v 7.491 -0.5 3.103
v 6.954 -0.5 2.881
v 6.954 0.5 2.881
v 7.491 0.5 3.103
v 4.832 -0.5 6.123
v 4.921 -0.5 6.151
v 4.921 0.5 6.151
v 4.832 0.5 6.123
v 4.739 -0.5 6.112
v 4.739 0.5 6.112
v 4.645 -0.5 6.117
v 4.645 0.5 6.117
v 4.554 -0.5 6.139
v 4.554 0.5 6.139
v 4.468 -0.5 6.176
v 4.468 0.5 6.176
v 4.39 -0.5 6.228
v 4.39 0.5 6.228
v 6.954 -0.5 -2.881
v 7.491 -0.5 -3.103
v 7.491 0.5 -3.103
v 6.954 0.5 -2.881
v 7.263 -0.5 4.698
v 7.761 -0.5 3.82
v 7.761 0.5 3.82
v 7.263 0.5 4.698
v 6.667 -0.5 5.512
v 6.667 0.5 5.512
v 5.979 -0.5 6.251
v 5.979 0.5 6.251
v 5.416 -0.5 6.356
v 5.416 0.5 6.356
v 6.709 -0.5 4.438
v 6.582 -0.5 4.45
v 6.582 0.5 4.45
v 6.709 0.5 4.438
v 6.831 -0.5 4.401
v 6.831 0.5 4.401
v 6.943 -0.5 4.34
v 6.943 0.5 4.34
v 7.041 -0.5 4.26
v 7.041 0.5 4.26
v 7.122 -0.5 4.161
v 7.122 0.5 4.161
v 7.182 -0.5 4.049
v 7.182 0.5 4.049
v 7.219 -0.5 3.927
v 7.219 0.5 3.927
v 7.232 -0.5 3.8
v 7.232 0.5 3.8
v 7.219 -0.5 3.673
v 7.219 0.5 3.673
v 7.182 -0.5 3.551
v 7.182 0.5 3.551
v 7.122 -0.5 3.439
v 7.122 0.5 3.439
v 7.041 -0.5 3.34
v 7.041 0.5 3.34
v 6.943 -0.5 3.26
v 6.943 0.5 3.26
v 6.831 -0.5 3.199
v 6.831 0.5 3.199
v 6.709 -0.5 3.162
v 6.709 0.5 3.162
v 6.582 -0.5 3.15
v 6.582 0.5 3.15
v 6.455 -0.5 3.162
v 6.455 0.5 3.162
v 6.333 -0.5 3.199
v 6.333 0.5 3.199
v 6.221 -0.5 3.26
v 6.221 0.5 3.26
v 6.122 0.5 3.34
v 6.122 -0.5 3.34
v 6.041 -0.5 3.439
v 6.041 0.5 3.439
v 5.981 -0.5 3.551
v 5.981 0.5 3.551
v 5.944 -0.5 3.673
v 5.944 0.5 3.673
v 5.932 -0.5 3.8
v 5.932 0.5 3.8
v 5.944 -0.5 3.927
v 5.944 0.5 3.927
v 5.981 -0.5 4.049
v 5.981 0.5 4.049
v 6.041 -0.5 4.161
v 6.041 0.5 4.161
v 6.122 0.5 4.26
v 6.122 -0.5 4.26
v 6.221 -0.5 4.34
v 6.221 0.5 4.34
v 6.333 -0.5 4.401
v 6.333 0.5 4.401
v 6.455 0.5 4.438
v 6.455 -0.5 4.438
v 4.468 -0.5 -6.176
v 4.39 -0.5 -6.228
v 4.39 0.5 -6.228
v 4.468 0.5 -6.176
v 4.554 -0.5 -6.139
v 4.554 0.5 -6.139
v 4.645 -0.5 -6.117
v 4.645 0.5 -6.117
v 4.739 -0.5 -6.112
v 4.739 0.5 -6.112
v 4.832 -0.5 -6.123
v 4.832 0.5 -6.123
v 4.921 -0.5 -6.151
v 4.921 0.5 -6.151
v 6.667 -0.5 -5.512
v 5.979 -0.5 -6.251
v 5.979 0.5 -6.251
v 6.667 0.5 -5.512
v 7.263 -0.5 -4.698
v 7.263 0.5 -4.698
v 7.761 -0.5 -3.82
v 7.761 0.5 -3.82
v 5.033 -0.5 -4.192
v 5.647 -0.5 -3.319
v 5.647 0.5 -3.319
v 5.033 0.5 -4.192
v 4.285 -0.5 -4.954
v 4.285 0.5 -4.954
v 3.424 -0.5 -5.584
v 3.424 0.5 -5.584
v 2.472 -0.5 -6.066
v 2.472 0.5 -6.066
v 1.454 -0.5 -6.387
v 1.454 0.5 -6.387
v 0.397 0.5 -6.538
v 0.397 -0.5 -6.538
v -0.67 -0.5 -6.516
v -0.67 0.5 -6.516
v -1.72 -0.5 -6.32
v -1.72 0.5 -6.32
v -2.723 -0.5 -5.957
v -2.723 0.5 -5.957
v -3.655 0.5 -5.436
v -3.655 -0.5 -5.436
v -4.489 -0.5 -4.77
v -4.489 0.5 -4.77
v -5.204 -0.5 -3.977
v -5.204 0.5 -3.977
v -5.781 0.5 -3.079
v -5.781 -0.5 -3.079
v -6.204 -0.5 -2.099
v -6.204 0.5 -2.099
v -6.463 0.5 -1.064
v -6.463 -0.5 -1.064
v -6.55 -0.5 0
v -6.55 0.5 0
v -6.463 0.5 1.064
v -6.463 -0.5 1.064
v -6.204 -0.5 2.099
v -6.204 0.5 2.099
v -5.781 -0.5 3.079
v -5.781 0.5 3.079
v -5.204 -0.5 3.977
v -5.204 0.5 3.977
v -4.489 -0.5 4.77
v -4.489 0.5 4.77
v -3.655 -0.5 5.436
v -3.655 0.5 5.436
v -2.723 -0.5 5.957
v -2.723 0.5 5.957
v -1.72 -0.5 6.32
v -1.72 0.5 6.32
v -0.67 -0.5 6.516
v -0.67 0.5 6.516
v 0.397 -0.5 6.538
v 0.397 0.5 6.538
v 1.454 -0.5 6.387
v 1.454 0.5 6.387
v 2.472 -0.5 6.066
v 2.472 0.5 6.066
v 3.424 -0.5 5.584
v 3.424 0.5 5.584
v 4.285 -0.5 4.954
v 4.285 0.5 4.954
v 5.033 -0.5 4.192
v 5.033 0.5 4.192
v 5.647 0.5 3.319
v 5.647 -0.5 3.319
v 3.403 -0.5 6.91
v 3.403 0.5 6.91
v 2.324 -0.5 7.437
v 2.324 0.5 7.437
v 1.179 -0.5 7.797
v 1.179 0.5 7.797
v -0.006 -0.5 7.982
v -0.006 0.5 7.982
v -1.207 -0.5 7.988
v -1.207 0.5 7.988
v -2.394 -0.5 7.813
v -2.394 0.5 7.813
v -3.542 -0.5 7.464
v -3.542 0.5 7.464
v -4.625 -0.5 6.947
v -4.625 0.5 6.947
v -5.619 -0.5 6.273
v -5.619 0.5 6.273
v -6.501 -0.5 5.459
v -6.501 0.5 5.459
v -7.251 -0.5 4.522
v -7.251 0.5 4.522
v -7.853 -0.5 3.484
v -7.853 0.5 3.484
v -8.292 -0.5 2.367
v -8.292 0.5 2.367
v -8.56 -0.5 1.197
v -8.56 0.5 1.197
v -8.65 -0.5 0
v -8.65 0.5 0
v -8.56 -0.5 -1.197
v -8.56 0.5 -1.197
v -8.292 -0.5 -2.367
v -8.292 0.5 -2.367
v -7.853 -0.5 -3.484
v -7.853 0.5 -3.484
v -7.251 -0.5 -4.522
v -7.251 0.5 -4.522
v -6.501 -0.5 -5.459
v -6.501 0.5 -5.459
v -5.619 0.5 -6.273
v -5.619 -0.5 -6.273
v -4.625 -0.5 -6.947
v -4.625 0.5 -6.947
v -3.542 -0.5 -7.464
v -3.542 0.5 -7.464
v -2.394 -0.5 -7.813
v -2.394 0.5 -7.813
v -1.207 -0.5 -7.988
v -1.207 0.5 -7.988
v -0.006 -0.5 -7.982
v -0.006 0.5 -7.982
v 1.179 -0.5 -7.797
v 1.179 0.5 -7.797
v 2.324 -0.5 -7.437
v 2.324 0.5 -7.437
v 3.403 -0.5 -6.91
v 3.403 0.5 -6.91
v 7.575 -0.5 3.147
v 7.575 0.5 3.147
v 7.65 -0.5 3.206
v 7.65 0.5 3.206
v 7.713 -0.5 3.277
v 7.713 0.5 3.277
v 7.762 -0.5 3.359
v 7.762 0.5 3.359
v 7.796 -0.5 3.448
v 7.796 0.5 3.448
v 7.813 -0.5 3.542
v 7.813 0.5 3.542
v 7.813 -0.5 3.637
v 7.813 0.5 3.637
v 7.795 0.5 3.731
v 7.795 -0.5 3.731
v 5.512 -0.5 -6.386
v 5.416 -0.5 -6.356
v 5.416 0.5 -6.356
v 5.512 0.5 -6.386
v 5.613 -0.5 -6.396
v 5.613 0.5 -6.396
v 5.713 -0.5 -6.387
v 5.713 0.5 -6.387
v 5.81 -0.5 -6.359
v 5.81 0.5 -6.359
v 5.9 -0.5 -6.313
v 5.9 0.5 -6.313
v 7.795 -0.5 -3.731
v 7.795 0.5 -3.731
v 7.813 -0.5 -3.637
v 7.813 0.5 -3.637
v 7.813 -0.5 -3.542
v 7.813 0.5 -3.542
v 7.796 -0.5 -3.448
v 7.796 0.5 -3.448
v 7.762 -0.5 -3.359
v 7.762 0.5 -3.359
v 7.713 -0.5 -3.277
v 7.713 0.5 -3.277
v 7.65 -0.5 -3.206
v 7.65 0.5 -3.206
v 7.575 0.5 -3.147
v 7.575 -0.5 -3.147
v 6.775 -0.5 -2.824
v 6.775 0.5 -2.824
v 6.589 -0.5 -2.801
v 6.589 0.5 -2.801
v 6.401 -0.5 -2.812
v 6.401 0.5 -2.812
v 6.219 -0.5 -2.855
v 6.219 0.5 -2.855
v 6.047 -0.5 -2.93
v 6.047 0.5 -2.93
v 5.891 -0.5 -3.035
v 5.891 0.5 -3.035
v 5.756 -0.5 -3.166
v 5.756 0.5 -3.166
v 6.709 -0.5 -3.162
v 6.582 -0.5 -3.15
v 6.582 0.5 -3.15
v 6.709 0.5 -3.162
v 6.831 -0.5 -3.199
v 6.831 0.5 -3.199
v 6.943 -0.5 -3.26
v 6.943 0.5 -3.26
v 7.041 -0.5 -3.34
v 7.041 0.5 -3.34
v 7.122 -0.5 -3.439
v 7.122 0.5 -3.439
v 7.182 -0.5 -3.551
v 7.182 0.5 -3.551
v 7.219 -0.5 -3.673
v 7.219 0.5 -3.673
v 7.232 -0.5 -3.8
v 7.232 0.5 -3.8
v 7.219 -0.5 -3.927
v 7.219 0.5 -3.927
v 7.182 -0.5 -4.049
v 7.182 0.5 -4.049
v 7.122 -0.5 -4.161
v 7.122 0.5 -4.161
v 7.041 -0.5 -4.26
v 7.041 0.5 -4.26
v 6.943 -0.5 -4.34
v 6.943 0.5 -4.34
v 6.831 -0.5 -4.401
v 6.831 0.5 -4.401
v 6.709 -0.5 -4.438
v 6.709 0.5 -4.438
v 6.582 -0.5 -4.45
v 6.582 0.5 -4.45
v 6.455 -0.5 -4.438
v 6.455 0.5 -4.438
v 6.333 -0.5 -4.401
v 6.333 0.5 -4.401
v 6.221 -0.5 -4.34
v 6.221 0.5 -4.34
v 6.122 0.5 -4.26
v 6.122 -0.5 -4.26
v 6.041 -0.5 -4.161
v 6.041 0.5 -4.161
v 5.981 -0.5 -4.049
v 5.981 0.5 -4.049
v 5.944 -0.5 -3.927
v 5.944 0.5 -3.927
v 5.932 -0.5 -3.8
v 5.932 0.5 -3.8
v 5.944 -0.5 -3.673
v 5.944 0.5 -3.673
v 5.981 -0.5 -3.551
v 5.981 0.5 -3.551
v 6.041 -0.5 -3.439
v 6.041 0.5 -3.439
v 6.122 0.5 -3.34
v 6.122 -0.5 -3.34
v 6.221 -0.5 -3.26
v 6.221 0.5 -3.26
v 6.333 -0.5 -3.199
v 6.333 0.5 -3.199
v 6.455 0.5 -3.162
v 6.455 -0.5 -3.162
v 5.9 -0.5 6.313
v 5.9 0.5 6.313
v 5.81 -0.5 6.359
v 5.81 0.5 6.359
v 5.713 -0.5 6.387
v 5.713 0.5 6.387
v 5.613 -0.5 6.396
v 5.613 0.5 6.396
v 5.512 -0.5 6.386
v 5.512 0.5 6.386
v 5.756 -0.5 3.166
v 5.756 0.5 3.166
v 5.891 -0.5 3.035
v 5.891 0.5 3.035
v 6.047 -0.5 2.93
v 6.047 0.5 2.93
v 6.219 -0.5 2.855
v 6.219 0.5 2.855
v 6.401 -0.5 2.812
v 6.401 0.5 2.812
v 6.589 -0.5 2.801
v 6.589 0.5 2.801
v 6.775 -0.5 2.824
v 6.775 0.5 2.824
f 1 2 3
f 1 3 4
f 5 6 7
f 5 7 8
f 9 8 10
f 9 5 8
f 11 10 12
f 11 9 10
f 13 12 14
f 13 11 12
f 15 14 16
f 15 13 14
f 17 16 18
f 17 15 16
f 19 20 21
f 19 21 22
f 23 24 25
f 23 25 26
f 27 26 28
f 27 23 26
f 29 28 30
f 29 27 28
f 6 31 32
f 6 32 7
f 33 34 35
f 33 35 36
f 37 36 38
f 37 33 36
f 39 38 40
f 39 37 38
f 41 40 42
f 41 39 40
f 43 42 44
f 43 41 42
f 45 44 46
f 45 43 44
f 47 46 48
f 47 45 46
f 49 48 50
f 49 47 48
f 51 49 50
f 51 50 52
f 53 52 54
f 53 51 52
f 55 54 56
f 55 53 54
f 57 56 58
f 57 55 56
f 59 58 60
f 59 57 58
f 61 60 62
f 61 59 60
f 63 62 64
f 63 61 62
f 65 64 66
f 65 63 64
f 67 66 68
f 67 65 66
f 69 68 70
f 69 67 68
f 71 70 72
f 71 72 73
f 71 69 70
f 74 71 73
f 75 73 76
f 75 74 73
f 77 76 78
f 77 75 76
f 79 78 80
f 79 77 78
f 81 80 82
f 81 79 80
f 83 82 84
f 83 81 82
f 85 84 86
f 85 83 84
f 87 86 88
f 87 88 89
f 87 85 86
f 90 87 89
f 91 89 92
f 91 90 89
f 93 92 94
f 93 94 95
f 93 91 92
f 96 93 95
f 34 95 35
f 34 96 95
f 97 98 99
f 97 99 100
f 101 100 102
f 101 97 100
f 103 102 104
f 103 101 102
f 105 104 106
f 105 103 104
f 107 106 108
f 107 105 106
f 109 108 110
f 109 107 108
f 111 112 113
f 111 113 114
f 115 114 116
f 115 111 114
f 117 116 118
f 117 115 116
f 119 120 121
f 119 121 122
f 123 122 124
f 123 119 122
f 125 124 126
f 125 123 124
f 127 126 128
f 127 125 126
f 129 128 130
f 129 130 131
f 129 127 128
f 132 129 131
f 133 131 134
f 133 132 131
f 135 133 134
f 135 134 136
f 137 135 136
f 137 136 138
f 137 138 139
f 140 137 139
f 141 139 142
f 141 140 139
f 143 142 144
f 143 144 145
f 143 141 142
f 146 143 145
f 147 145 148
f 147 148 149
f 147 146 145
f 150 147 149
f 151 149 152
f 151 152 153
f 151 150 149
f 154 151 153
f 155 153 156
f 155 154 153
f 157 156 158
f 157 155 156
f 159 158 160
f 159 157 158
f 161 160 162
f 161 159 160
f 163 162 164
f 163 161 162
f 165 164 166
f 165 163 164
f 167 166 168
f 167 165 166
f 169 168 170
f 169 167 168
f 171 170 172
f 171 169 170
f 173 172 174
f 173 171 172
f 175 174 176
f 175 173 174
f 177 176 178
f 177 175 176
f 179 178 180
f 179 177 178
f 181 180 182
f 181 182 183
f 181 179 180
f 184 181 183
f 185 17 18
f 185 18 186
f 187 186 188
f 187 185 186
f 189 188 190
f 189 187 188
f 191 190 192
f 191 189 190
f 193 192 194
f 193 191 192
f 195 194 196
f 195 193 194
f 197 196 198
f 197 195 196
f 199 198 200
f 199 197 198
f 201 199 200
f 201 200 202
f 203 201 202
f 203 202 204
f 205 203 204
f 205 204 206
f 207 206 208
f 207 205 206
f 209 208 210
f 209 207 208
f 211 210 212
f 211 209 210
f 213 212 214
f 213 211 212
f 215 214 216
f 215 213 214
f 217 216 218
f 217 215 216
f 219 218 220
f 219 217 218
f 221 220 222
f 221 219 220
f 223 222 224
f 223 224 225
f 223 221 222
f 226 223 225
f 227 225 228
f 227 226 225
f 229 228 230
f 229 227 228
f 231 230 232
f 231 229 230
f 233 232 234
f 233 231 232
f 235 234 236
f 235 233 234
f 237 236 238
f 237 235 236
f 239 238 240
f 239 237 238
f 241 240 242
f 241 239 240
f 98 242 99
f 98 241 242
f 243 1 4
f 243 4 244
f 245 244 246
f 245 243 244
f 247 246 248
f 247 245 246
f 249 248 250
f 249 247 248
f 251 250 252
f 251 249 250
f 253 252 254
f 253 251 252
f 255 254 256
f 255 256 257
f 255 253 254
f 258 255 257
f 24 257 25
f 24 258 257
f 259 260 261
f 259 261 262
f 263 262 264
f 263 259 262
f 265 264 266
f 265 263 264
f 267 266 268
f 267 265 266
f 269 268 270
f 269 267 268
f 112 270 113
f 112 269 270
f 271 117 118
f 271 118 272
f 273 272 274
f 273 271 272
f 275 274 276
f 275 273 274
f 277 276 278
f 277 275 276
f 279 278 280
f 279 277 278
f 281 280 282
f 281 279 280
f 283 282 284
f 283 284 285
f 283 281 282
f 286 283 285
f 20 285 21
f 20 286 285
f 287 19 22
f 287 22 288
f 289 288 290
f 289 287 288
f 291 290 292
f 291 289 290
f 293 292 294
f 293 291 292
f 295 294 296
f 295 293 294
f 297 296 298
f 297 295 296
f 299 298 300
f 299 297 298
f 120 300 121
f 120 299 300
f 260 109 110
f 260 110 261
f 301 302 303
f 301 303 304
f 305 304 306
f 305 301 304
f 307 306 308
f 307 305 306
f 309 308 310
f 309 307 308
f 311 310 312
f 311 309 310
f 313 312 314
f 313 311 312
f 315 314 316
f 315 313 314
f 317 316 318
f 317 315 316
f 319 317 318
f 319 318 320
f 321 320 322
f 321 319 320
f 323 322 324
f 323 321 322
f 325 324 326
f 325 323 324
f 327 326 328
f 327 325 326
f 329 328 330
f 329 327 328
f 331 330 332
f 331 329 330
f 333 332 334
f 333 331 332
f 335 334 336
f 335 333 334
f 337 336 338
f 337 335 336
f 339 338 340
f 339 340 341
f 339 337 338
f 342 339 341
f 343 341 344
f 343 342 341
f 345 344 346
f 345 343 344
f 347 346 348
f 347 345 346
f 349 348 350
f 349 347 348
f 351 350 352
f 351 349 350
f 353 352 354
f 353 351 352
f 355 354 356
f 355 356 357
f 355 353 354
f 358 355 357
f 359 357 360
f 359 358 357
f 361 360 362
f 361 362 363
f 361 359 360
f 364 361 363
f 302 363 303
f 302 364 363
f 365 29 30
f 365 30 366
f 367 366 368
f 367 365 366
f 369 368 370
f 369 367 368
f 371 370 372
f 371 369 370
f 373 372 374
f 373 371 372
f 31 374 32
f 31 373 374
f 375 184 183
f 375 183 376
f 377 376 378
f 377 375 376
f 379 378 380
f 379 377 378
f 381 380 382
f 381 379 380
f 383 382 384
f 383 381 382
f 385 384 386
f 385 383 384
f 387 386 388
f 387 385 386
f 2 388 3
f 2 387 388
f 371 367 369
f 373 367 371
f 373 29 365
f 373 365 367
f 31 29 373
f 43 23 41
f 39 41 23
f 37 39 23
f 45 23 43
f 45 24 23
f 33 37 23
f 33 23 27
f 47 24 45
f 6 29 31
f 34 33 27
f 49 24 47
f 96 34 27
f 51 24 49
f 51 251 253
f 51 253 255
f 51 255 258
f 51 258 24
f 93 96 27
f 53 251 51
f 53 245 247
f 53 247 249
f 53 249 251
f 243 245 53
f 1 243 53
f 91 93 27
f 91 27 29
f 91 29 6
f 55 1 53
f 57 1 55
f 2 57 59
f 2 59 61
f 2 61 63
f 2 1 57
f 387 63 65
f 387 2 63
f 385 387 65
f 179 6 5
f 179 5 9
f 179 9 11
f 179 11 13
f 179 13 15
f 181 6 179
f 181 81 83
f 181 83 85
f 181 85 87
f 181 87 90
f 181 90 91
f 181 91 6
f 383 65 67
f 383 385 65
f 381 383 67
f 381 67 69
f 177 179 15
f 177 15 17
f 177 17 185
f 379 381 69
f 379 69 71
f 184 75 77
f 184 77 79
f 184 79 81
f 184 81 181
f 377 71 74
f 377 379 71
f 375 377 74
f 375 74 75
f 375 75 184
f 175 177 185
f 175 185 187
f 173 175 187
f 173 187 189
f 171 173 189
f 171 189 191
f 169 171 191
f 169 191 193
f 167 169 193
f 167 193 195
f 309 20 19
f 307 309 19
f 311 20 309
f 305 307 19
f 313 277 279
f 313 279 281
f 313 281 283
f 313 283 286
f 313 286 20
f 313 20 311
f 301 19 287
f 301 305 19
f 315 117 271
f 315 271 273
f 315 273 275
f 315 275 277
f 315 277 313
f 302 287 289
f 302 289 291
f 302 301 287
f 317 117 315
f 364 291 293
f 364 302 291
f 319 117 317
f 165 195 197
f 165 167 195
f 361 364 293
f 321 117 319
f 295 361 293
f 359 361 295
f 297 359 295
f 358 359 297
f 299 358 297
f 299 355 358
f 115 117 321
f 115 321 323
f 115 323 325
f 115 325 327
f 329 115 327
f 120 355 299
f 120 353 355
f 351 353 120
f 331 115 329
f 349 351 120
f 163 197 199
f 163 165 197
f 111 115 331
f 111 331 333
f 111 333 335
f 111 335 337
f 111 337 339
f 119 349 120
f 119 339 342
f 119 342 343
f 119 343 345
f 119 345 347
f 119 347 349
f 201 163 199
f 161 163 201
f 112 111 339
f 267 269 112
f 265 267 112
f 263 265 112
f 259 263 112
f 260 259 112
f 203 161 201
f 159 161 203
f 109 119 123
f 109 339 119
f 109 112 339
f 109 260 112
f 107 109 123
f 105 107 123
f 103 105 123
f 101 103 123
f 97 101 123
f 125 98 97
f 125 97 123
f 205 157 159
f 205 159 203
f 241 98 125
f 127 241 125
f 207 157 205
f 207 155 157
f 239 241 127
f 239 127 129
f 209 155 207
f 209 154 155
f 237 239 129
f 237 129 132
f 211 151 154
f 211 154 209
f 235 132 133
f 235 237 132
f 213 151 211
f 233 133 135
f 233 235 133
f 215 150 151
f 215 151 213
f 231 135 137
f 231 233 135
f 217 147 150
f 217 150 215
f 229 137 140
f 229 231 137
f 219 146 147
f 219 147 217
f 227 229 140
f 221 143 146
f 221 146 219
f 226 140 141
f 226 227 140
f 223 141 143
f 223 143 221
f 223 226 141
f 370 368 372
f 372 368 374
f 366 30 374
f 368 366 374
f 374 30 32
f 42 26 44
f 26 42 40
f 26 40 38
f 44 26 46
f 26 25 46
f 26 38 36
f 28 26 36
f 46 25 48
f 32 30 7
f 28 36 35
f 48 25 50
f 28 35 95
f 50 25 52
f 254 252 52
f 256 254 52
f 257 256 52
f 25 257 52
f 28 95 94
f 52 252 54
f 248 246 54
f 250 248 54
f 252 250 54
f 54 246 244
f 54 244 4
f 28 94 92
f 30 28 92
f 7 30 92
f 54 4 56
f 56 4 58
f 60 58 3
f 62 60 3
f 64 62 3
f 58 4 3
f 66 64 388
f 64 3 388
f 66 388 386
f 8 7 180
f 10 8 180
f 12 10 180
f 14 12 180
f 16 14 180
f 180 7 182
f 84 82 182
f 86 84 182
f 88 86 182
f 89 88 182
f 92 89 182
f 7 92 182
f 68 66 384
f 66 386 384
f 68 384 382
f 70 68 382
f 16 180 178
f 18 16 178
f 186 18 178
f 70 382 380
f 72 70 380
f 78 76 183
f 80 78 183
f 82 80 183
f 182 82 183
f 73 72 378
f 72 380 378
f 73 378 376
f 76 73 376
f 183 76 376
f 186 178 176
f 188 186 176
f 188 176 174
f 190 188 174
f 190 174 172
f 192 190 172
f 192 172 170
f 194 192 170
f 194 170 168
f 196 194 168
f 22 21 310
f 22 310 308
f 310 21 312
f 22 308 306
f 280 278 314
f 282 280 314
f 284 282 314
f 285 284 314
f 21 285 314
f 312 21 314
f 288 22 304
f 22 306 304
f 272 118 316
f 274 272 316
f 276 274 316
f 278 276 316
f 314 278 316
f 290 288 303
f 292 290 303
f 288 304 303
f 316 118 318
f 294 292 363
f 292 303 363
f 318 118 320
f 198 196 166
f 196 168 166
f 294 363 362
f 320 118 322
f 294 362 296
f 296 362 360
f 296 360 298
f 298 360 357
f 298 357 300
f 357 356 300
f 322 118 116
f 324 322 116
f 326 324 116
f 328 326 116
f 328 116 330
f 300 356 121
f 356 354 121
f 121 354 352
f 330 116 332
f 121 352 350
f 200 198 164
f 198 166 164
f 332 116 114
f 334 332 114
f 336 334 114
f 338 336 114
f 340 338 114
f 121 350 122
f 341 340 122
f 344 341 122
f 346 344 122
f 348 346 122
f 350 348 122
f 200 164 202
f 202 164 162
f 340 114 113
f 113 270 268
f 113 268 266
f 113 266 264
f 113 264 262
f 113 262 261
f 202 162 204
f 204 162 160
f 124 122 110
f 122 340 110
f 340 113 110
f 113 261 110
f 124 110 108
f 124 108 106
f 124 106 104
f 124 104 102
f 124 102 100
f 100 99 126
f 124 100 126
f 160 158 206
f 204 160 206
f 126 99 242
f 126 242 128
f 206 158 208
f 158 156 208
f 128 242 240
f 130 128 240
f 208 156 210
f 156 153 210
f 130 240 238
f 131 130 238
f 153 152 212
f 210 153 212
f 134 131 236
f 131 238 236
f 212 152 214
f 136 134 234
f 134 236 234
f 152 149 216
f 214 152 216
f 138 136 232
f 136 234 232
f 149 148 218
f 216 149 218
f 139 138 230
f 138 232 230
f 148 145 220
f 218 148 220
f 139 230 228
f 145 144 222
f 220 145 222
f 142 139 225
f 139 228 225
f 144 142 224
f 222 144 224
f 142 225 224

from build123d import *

# Parameters (mm, degrees)
BOSS_EXTRUDE1_DEPTH      = 0.5
BOSS_EXTRUDE1_DEPTH_BACK = 0.5
SKETCH3_R                = 0.65


with BuildPart() as part:
    # Sketch3 → Boss-Extrude1 (new, two sides: drawn at the far end of the back side and taken through both)
    with BuildSketch(Plane(origin=(0, 0, 0), x_dir=(1, 0, 0), z_dir=(0, 1, 0)).offset(-BOSS_EXTRUDE1_DEPTH_BACK)):
        with BuildLine():
            Line((4.921075662, 6.151466642), (5.415516704, 6.356270827))
            ThreePointArc((5.415516704, 6.356270827), (5.713132029, 6.387250398), (5.979333, 6.25060612))
            ThreePointArc((5.979333, 6.25060612), (6.97684177, 5.113333445), (7.760966936, 3.819671741))
            ThreePointArc((7.760966936, 3.819671741), (7.78120317, 3.402716753), (7.490834393, 3.102805199))
            Line((7.490834393, 3.102805199), (6.954149928, 2.880503215))
            ThreePointArc((6.954149928, 2.880503215), (6.218652108, 2.855007785), (5.647075885, 3.318589151))
            ThreePointArc((5.647075885, 3.318589151), (-6.55, 0), (5.647075885, -3.318589151))
            ThreePointArc((5.647075885, -3.318589151), (6.218652108, -2.855007785), (6.954149928, -2.880503215))
            Line((6.954149928, -2.880503215), (7.490834393, -3.102805199))
            ThreePointArc((7.490834393, -3.102805199), (7.78120317, -3.402716753), (7.760966936, -3.819671741))
            ThreePointArc((7.760966936, -3.819671741), (6.97684177, -5.113333445), (5.979333, -6.25060612))
            ThreePointArc((5.979333, -6.25060612), (5.713132029, -6.387250398), (5.415516704, -6.356270827))
            Line((5.415516704, -6.356270827), (4.921075662, -6.151466642))
            ThreePointArc((4.921075662, -6.151466642), (4.645102726, -6.116897415), (4.390197066, -6.228159258))
            ThreePointArc((4.390197066, -6.228159258), (-8.65, 0), (4.390197066, 6.228159258))
            ThreePointArc((4.390197066, 6.228159258), (4.645102726, 6.116897415), (4.921075662, 6.151466642))
        make_face()
        with Locations(Location((6.581793069, -3.8, 0), (0, 0, 270))):
            Circle(SKETCH3_R, mode=Mode.SUBTRACT)
        with Locations(Location((6.581793069, 3.8, 0), (0, 0, 270))):
            Circle(SKETCH3_R, mode=Mode.SUBTRACT)
    extrude(amount=BOSS_EXTRUDE1_DEPTH + BOSS_EXTRUDE1_DEPTH_BACK)


solid = part.part
